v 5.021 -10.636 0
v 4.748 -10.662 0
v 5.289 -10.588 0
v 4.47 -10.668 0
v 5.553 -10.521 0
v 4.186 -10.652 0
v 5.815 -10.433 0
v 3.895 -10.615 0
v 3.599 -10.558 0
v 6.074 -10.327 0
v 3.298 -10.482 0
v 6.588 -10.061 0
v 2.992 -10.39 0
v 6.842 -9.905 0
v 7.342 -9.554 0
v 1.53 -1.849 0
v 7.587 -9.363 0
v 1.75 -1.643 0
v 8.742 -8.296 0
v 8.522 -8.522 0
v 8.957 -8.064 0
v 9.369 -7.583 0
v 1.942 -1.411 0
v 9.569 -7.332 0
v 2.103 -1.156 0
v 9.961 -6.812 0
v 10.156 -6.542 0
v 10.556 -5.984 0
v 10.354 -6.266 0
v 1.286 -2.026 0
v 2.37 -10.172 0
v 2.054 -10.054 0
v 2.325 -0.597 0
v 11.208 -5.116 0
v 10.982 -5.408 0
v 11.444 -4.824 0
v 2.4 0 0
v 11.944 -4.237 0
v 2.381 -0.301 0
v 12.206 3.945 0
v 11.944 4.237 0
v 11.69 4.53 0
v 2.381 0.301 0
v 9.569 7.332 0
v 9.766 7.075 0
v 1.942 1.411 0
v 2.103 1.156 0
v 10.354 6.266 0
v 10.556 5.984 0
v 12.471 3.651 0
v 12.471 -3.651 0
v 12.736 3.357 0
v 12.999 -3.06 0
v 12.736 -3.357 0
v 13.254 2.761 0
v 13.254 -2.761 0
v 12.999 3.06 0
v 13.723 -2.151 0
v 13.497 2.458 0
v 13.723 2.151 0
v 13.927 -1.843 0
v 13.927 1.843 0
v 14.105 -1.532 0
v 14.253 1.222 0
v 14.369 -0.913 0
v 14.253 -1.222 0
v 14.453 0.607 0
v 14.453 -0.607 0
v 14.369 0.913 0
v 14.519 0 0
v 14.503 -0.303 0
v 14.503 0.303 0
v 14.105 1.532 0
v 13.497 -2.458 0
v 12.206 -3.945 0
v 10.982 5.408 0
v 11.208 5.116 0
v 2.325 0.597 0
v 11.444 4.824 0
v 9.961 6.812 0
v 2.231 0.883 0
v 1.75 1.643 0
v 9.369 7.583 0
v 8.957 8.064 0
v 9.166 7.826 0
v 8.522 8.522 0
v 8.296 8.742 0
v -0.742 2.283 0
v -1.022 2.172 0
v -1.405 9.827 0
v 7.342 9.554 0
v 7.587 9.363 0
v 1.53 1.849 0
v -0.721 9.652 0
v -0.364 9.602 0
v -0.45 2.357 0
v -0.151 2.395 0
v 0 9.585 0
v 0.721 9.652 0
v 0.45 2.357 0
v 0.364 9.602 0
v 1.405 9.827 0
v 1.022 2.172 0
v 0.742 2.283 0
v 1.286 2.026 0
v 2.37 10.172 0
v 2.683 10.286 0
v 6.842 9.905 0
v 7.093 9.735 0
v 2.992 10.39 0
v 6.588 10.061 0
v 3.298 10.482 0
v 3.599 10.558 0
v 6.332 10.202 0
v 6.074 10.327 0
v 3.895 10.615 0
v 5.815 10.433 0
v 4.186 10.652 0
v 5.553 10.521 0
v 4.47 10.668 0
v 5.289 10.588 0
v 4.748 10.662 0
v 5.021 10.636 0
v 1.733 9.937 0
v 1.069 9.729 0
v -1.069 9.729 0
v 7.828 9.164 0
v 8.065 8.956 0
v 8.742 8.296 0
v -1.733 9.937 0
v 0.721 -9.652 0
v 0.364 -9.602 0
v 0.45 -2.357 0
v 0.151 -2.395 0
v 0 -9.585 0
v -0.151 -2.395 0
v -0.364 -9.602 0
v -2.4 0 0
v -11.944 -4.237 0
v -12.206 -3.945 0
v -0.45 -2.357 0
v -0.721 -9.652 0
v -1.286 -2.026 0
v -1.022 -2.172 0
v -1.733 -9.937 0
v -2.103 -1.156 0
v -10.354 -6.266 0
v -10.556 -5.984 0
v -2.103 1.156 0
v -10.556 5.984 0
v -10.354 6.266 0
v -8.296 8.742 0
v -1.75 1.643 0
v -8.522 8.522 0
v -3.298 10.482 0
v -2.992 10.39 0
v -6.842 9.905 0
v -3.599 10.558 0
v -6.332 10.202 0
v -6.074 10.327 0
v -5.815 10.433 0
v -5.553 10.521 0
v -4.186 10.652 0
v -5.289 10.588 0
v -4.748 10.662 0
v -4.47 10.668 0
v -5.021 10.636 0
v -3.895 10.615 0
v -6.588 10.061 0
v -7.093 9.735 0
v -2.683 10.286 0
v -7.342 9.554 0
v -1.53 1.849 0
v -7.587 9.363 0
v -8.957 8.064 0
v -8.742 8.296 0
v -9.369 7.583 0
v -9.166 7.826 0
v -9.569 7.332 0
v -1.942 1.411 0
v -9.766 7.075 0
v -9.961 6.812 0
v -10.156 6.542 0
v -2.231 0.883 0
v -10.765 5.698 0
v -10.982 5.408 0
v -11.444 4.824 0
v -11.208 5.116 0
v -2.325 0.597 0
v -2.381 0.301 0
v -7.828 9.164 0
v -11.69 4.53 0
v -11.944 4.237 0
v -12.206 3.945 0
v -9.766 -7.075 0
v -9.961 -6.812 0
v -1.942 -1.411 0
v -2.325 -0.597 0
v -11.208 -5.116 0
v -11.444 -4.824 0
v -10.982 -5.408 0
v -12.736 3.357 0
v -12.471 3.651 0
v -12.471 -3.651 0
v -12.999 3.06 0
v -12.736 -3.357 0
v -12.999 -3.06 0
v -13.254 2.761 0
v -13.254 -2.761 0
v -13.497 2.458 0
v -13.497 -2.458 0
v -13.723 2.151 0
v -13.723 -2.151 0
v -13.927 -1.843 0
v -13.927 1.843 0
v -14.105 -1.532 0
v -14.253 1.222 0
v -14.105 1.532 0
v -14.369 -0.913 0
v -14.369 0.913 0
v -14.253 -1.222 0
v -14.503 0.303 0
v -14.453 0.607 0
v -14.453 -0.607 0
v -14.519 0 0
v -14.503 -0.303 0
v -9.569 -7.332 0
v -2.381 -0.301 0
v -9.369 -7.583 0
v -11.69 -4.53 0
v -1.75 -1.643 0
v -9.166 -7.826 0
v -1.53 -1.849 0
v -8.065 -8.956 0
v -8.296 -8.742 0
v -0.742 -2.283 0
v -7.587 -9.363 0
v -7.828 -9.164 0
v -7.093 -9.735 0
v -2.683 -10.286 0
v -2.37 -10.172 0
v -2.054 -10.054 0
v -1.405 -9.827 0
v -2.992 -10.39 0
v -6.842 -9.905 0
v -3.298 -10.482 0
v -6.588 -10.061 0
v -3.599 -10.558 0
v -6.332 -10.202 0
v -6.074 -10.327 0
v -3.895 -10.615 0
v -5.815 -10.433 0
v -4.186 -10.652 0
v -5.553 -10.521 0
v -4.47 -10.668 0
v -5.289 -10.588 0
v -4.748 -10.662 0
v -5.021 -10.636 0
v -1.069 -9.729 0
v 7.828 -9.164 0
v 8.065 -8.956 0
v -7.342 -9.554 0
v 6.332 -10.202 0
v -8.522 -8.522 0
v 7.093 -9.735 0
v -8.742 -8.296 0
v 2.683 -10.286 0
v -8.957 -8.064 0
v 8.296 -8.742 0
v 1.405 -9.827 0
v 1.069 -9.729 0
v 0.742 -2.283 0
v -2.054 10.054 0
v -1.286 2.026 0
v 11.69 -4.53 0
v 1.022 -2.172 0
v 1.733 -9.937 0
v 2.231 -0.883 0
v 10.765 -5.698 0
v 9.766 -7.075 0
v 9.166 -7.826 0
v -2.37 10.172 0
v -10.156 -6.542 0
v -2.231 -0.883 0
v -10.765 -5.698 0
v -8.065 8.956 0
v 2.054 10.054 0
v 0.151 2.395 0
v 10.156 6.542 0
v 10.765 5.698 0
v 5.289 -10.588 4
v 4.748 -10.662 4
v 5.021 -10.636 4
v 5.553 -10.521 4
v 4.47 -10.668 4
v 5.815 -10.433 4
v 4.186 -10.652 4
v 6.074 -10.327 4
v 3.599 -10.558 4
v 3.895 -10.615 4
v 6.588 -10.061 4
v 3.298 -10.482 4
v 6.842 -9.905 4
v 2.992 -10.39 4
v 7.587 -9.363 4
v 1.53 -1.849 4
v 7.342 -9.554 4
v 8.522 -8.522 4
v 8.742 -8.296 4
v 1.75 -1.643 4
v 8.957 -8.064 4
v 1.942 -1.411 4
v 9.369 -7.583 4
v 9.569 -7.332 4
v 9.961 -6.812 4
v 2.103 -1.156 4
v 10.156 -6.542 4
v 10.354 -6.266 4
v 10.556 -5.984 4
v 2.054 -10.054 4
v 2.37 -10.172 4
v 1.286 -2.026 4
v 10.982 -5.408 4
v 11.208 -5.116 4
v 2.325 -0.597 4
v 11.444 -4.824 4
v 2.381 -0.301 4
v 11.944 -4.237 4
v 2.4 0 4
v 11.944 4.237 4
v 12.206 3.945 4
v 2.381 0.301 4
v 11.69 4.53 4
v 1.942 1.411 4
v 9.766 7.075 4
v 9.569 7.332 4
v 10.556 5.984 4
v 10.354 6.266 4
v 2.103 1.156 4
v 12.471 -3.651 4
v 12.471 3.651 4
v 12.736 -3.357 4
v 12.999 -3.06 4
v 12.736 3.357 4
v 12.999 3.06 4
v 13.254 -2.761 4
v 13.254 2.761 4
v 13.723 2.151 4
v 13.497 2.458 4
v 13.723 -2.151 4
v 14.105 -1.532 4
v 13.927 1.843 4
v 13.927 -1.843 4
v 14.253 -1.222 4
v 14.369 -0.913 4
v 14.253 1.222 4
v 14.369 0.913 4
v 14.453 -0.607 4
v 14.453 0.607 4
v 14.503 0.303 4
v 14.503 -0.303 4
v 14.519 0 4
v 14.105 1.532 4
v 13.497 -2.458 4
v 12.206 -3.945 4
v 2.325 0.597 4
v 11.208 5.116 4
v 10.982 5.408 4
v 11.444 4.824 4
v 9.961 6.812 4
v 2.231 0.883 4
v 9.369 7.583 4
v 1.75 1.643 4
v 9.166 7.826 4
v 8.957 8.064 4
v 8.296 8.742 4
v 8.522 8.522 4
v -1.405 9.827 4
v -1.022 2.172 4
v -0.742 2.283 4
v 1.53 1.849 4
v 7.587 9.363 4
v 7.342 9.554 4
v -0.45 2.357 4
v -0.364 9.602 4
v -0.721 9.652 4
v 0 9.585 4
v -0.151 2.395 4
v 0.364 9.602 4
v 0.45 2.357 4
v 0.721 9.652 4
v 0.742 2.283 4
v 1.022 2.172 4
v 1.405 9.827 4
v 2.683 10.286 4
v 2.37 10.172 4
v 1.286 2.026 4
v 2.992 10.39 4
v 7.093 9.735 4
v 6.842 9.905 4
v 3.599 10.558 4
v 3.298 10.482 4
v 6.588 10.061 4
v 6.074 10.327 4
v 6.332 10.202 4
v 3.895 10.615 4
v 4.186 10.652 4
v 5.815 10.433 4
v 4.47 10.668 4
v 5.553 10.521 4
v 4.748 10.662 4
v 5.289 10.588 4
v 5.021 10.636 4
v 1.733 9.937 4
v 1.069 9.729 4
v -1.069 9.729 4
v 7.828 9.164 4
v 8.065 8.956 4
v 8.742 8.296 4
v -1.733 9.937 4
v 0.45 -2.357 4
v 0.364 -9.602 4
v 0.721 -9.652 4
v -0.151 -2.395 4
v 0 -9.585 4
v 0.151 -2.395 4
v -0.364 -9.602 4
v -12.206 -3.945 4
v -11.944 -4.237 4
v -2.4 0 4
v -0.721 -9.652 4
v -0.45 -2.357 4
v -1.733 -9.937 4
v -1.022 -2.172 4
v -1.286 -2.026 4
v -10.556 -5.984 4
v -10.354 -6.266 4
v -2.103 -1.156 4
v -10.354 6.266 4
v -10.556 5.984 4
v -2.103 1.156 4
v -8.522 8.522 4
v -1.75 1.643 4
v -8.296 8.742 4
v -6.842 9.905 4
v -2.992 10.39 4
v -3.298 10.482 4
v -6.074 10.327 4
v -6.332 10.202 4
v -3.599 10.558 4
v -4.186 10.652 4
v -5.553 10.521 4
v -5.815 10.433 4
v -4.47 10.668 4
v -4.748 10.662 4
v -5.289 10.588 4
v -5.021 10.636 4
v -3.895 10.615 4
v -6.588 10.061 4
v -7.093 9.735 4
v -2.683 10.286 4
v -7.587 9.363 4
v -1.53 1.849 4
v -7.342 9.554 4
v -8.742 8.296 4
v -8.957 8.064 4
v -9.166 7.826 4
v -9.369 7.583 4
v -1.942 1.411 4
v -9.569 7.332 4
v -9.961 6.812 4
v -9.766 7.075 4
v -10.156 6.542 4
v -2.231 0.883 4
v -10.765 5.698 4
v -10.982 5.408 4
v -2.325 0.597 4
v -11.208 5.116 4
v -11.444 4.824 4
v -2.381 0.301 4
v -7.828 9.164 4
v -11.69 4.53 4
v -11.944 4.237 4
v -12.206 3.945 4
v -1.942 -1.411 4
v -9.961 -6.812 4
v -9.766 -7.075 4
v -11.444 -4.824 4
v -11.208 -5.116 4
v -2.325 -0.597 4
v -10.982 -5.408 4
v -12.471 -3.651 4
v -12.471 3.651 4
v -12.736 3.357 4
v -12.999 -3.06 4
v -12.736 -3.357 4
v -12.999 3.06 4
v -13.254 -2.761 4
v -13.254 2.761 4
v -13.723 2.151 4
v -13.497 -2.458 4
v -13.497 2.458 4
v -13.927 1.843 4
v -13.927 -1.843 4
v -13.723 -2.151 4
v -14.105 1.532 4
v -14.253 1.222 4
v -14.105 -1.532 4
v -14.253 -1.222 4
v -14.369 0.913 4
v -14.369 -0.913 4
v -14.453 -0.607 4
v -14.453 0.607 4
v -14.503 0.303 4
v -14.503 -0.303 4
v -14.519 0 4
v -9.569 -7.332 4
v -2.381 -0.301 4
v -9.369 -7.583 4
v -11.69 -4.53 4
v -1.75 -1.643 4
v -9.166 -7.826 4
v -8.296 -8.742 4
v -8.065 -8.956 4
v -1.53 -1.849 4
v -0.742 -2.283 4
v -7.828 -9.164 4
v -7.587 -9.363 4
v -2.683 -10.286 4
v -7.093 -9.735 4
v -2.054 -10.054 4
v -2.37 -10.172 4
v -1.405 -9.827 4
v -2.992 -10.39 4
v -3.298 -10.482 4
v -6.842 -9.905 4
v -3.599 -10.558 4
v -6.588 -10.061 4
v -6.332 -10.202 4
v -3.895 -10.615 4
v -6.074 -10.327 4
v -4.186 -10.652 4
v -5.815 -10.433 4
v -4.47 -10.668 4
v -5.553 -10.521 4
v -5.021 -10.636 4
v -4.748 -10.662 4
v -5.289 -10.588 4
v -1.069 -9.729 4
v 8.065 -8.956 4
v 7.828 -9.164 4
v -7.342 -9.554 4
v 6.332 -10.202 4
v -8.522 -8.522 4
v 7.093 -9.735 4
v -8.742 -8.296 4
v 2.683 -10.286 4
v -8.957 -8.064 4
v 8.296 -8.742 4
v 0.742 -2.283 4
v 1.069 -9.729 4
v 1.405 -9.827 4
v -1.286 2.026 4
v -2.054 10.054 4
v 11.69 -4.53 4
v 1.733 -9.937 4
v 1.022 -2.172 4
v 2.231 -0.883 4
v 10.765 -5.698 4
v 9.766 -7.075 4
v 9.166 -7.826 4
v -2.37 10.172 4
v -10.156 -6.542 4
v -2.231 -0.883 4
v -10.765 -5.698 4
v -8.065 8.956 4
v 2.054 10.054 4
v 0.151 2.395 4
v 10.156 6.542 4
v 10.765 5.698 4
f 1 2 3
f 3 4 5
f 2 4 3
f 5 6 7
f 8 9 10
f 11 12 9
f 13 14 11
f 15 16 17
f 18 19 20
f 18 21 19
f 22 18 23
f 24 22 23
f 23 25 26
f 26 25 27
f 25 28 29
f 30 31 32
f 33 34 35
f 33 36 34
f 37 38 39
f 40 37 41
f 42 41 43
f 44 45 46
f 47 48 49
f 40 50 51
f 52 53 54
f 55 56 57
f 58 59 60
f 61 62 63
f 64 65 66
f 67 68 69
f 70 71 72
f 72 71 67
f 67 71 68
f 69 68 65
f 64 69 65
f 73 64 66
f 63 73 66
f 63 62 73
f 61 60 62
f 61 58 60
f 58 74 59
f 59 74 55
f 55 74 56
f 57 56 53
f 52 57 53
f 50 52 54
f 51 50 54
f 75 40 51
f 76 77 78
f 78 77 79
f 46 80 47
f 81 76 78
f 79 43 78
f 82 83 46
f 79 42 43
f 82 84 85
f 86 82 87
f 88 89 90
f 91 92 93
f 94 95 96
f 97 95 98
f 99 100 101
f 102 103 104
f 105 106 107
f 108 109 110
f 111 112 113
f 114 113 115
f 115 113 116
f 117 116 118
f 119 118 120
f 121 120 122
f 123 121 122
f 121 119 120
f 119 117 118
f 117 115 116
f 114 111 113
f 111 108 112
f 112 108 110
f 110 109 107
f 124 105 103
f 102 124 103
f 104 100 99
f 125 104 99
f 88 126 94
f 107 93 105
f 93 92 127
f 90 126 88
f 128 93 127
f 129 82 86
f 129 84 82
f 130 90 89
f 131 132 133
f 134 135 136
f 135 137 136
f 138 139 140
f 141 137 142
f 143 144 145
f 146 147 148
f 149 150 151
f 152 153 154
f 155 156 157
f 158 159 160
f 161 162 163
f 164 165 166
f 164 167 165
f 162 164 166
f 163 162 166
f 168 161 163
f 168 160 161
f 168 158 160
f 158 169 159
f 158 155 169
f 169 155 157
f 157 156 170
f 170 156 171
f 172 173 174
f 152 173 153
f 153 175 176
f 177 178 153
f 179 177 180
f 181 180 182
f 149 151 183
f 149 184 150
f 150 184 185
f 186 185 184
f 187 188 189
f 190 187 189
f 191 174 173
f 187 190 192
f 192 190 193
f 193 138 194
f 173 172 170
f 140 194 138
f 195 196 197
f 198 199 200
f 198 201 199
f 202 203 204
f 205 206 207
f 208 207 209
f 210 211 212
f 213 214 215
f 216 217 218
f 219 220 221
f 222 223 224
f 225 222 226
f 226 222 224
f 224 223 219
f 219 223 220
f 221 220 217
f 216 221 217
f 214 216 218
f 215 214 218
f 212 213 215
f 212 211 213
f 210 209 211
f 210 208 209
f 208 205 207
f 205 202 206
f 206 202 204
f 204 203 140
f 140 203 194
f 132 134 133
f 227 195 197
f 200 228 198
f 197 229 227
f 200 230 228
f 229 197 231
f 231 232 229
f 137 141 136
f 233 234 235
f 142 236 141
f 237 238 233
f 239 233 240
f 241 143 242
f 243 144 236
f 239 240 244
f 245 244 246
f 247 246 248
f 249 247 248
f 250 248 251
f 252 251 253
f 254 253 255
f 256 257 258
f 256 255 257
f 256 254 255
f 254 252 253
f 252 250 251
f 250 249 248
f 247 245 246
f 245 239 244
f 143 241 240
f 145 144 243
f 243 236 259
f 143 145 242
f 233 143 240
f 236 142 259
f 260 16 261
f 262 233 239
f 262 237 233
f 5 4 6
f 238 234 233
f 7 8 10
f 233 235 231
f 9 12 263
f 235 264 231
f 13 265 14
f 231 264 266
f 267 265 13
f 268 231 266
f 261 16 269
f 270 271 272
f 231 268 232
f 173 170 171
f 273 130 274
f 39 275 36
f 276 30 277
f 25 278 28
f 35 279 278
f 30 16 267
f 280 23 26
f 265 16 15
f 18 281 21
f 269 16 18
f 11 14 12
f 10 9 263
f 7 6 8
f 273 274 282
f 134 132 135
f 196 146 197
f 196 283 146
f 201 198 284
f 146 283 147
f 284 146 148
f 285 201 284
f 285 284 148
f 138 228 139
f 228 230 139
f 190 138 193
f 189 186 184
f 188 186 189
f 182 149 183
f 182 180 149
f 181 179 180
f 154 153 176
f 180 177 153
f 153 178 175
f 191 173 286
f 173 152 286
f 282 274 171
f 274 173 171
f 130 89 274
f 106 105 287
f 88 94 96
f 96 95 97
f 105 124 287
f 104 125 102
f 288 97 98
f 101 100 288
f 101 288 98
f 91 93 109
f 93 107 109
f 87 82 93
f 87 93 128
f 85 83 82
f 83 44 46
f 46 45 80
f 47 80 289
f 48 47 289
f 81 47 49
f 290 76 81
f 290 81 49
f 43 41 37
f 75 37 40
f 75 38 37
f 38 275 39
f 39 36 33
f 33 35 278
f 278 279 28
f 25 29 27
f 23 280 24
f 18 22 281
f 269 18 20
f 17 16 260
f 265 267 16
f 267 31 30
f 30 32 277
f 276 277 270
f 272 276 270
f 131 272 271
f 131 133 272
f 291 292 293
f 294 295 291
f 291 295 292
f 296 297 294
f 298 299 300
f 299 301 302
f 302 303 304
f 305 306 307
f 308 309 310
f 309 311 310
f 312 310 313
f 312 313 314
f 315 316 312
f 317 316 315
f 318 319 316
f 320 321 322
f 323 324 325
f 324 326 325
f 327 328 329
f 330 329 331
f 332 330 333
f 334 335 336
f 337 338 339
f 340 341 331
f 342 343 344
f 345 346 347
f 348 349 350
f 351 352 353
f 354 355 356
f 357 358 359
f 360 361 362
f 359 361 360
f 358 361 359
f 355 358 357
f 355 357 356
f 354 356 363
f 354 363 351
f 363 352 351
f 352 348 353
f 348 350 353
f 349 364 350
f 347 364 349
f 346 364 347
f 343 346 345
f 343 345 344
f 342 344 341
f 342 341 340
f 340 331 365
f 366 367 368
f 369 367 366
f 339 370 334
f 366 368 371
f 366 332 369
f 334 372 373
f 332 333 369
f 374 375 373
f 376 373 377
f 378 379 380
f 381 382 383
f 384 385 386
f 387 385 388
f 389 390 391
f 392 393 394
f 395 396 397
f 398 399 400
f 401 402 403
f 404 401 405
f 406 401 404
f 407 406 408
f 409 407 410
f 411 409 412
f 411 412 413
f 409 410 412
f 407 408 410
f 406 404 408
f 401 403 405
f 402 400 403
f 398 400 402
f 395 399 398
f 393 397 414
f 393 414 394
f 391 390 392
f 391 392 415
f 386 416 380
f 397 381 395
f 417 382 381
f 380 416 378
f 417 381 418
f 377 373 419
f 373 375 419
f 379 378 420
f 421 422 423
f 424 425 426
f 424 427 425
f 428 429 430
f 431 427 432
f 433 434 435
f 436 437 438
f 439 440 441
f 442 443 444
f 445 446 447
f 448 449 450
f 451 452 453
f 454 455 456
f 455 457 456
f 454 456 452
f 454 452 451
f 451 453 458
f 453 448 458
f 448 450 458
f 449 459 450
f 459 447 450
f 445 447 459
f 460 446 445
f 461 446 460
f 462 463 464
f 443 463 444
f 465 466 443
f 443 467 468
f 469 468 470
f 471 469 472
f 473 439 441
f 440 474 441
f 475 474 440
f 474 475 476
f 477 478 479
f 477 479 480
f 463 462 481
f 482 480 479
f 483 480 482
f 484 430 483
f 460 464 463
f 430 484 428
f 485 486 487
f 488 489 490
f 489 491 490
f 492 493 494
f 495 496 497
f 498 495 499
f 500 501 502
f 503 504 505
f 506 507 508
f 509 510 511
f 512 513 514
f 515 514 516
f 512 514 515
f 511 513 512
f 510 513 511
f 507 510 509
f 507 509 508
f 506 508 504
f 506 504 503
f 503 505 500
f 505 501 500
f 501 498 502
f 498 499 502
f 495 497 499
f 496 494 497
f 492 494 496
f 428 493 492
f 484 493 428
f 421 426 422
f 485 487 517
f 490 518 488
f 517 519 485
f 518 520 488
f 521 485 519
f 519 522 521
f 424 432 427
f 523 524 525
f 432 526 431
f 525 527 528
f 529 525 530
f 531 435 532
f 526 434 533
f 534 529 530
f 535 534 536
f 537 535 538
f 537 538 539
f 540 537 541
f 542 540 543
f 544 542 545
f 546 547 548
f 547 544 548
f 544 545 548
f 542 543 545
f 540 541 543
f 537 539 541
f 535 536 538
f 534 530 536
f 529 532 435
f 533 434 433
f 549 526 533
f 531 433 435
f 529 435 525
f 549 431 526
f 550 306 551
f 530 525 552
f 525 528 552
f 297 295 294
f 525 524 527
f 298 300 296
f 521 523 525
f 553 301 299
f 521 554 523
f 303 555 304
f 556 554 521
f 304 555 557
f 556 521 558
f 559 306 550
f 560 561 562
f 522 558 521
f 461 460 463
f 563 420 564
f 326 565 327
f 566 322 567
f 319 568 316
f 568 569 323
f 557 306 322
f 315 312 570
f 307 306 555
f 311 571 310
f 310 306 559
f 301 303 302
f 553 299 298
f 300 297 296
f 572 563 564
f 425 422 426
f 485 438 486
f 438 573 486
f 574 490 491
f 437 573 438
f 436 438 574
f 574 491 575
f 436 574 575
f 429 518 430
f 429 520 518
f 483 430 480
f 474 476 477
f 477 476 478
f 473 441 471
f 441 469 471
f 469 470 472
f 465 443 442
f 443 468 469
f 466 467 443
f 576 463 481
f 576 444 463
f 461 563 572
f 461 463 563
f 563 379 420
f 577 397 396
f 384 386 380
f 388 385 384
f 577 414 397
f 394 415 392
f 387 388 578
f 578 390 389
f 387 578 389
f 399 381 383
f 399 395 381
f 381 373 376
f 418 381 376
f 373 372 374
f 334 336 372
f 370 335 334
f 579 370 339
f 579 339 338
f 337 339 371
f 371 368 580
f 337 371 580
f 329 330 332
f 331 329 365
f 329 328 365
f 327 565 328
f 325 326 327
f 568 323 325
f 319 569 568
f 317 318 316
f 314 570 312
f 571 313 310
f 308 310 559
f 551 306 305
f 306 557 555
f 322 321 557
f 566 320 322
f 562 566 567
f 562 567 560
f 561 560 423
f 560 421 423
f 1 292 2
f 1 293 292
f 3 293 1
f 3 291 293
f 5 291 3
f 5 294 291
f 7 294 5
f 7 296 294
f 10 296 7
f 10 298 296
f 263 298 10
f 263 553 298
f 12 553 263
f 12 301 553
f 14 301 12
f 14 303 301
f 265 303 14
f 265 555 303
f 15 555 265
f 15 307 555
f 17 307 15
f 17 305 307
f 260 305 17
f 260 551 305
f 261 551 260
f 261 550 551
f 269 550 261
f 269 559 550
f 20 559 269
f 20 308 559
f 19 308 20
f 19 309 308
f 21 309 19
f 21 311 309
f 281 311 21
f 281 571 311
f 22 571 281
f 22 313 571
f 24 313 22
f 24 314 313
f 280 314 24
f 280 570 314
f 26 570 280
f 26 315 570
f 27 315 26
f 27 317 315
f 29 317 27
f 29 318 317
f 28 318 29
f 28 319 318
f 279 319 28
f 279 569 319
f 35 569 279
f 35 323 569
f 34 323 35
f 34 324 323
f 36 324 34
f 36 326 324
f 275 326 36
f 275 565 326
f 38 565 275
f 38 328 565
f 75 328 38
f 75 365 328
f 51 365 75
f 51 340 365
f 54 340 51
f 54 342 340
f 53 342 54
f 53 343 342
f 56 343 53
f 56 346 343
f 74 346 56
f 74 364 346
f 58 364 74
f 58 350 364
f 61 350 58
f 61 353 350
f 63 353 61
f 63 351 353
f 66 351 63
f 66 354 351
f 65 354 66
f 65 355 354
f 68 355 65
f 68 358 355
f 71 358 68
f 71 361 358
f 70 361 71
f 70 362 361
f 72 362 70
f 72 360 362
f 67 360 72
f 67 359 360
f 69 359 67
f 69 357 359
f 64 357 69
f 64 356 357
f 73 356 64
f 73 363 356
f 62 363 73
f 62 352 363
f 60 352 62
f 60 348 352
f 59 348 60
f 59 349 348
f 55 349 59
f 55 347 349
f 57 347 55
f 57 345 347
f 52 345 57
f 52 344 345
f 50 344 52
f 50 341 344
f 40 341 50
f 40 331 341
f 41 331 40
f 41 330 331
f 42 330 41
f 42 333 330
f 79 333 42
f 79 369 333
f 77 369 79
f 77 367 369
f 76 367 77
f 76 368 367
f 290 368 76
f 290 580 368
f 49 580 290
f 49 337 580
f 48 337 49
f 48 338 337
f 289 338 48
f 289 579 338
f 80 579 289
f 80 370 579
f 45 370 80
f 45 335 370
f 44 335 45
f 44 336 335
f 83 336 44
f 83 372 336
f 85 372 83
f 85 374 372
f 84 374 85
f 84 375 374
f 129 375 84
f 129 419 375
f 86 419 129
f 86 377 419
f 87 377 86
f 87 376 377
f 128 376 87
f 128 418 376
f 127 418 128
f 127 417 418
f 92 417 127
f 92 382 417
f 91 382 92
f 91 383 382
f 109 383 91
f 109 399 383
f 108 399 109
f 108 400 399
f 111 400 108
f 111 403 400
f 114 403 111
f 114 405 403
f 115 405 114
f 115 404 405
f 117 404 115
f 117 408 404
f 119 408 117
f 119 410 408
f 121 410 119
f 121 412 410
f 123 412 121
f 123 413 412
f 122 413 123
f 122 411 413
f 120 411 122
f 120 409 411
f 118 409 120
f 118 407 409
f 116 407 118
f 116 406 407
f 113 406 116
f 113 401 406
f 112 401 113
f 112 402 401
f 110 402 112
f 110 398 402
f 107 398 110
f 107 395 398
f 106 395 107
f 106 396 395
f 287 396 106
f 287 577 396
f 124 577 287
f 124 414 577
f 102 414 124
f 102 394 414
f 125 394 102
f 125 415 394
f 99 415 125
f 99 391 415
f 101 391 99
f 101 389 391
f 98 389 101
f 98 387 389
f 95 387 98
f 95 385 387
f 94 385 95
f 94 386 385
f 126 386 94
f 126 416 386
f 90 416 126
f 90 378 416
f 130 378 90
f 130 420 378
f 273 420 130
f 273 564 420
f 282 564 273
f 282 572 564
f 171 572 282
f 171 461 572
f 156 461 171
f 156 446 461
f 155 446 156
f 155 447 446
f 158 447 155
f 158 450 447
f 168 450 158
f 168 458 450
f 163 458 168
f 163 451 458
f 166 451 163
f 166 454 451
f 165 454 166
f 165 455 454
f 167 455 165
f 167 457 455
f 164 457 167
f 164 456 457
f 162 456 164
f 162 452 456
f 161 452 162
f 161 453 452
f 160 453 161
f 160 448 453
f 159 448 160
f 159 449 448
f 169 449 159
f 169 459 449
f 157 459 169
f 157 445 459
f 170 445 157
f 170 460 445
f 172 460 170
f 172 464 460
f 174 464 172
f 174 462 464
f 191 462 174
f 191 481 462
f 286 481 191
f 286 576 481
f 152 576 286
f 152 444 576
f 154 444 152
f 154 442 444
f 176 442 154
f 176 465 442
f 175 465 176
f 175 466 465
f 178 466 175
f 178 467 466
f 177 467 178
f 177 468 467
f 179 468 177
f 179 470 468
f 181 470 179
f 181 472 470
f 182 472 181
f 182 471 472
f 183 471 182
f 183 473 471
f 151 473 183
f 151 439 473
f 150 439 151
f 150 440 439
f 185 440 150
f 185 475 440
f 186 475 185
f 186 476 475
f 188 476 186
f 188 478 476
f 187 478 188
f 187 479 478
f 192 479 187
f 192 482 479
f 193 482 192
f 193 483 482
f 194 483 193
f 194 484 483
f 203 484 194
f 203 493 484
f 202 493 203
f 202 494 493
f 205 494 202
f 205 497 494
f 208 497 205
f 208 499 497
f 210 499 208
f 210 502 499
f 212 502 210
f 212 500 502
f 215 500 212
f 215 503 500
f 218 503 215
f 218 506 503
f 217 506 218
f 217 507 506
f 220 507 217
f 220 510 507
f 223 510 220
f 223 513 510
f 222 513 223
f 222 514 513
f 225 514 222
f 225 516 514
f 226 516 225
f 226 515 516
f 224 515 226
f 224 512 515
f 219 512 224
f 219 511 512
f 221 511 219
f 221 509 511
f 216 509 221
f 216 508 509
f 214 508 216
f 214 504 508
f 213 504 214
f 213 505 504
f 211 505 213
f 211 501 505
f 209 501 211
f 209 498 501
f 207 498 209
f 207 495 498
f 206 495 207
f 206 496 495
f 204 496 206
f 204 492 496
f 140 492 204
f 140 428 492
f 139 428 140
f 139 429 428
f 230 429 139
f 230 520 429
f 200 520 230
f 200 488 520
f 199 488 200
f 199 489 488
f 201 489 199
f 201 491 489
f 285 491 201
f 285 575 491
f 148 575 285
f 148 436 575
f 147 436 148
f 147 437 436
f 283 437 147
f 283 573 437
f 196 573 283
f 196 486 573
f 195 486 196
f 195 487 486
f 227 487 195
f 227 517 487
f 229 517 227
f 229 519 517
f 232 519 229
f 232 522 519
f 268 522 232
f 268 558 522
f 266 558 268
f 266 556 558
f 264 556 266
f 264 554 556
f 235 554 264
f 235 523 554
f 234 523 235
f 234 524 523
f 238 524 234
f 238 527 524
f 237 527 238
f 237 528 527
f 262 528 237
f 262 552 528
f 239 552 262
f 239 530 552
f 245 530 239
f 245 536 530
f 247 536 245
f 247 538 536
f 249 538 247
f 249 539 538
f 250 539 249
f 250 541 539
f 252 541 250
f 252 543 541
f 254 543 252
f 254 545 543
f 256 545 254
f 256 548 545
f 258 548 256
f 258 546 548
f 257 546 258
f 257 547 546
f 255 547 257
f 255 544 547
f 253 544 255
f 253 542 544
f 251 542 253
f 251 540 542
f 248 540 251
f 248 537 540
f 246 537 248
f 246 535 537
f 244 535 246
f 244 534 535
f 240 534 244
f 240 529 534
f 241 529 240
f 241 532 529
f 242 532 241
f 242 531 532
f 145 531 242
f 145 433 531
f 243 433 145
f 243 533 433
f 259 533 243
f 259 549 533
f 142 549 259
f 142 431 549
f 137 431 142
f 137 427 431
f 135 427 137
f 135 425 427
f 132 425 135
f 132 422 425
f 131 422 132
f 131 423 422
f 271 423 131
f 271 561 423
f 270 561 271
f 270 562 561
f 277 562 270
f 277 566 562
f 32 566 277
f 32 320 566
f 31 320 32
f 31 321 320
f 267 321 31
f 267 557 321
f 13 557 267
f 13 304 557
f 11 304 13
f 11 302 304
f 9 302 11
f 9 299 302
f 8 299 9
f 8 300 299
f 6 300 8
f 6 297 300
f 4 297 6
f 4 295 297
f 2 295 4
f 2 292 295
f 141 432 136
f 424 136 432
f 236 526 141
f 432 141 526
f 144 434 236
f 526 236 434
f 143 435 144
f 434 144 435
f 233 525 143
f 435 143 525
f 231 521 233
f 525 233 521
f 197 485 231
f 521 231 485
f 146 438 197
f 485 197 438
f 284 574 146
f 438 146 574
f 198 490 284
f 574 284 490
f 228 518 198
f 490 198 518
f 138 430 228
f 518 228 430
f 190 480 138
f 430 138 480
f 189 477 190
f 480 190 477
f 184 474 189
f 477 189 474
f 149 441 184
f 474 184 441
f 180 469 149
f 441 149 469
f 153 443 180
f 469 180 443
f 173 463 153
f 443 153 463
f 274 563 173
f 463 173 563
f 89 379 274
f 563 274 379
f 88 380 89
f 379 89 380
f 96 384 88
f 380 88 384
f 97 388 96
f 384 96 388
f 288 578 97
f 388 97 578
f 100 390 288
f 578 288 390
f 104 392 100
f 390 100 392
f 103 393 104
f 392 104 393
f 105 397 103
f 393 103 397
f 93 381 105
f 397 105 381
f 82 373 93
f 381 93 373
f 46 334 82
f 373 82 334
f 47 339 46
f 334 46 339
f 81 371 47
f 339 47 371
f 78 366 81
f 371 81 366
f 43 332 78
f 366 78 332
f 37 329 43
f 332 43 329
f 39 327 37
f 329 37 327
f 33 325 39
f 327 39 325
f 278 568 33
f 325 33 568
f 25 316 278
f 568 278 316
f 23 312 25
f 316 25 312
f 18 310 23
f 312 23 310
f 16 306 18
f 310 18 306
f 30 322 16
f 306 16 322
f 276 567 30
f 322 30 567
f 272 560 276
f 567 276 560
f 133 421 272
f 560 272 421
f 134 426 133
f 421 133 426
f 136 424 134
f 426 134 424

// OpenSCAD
/***
 * @function curve_gear_cosine_quintic_body_example
  * @image ../images/functions/cosine_quintic/curve_gear_cosine_quintic_body.png cosine quintic body example preview
*/
use <curve_gear_cosine_quintic.scad>;
_main_example_cosine_quintic_view("body");
